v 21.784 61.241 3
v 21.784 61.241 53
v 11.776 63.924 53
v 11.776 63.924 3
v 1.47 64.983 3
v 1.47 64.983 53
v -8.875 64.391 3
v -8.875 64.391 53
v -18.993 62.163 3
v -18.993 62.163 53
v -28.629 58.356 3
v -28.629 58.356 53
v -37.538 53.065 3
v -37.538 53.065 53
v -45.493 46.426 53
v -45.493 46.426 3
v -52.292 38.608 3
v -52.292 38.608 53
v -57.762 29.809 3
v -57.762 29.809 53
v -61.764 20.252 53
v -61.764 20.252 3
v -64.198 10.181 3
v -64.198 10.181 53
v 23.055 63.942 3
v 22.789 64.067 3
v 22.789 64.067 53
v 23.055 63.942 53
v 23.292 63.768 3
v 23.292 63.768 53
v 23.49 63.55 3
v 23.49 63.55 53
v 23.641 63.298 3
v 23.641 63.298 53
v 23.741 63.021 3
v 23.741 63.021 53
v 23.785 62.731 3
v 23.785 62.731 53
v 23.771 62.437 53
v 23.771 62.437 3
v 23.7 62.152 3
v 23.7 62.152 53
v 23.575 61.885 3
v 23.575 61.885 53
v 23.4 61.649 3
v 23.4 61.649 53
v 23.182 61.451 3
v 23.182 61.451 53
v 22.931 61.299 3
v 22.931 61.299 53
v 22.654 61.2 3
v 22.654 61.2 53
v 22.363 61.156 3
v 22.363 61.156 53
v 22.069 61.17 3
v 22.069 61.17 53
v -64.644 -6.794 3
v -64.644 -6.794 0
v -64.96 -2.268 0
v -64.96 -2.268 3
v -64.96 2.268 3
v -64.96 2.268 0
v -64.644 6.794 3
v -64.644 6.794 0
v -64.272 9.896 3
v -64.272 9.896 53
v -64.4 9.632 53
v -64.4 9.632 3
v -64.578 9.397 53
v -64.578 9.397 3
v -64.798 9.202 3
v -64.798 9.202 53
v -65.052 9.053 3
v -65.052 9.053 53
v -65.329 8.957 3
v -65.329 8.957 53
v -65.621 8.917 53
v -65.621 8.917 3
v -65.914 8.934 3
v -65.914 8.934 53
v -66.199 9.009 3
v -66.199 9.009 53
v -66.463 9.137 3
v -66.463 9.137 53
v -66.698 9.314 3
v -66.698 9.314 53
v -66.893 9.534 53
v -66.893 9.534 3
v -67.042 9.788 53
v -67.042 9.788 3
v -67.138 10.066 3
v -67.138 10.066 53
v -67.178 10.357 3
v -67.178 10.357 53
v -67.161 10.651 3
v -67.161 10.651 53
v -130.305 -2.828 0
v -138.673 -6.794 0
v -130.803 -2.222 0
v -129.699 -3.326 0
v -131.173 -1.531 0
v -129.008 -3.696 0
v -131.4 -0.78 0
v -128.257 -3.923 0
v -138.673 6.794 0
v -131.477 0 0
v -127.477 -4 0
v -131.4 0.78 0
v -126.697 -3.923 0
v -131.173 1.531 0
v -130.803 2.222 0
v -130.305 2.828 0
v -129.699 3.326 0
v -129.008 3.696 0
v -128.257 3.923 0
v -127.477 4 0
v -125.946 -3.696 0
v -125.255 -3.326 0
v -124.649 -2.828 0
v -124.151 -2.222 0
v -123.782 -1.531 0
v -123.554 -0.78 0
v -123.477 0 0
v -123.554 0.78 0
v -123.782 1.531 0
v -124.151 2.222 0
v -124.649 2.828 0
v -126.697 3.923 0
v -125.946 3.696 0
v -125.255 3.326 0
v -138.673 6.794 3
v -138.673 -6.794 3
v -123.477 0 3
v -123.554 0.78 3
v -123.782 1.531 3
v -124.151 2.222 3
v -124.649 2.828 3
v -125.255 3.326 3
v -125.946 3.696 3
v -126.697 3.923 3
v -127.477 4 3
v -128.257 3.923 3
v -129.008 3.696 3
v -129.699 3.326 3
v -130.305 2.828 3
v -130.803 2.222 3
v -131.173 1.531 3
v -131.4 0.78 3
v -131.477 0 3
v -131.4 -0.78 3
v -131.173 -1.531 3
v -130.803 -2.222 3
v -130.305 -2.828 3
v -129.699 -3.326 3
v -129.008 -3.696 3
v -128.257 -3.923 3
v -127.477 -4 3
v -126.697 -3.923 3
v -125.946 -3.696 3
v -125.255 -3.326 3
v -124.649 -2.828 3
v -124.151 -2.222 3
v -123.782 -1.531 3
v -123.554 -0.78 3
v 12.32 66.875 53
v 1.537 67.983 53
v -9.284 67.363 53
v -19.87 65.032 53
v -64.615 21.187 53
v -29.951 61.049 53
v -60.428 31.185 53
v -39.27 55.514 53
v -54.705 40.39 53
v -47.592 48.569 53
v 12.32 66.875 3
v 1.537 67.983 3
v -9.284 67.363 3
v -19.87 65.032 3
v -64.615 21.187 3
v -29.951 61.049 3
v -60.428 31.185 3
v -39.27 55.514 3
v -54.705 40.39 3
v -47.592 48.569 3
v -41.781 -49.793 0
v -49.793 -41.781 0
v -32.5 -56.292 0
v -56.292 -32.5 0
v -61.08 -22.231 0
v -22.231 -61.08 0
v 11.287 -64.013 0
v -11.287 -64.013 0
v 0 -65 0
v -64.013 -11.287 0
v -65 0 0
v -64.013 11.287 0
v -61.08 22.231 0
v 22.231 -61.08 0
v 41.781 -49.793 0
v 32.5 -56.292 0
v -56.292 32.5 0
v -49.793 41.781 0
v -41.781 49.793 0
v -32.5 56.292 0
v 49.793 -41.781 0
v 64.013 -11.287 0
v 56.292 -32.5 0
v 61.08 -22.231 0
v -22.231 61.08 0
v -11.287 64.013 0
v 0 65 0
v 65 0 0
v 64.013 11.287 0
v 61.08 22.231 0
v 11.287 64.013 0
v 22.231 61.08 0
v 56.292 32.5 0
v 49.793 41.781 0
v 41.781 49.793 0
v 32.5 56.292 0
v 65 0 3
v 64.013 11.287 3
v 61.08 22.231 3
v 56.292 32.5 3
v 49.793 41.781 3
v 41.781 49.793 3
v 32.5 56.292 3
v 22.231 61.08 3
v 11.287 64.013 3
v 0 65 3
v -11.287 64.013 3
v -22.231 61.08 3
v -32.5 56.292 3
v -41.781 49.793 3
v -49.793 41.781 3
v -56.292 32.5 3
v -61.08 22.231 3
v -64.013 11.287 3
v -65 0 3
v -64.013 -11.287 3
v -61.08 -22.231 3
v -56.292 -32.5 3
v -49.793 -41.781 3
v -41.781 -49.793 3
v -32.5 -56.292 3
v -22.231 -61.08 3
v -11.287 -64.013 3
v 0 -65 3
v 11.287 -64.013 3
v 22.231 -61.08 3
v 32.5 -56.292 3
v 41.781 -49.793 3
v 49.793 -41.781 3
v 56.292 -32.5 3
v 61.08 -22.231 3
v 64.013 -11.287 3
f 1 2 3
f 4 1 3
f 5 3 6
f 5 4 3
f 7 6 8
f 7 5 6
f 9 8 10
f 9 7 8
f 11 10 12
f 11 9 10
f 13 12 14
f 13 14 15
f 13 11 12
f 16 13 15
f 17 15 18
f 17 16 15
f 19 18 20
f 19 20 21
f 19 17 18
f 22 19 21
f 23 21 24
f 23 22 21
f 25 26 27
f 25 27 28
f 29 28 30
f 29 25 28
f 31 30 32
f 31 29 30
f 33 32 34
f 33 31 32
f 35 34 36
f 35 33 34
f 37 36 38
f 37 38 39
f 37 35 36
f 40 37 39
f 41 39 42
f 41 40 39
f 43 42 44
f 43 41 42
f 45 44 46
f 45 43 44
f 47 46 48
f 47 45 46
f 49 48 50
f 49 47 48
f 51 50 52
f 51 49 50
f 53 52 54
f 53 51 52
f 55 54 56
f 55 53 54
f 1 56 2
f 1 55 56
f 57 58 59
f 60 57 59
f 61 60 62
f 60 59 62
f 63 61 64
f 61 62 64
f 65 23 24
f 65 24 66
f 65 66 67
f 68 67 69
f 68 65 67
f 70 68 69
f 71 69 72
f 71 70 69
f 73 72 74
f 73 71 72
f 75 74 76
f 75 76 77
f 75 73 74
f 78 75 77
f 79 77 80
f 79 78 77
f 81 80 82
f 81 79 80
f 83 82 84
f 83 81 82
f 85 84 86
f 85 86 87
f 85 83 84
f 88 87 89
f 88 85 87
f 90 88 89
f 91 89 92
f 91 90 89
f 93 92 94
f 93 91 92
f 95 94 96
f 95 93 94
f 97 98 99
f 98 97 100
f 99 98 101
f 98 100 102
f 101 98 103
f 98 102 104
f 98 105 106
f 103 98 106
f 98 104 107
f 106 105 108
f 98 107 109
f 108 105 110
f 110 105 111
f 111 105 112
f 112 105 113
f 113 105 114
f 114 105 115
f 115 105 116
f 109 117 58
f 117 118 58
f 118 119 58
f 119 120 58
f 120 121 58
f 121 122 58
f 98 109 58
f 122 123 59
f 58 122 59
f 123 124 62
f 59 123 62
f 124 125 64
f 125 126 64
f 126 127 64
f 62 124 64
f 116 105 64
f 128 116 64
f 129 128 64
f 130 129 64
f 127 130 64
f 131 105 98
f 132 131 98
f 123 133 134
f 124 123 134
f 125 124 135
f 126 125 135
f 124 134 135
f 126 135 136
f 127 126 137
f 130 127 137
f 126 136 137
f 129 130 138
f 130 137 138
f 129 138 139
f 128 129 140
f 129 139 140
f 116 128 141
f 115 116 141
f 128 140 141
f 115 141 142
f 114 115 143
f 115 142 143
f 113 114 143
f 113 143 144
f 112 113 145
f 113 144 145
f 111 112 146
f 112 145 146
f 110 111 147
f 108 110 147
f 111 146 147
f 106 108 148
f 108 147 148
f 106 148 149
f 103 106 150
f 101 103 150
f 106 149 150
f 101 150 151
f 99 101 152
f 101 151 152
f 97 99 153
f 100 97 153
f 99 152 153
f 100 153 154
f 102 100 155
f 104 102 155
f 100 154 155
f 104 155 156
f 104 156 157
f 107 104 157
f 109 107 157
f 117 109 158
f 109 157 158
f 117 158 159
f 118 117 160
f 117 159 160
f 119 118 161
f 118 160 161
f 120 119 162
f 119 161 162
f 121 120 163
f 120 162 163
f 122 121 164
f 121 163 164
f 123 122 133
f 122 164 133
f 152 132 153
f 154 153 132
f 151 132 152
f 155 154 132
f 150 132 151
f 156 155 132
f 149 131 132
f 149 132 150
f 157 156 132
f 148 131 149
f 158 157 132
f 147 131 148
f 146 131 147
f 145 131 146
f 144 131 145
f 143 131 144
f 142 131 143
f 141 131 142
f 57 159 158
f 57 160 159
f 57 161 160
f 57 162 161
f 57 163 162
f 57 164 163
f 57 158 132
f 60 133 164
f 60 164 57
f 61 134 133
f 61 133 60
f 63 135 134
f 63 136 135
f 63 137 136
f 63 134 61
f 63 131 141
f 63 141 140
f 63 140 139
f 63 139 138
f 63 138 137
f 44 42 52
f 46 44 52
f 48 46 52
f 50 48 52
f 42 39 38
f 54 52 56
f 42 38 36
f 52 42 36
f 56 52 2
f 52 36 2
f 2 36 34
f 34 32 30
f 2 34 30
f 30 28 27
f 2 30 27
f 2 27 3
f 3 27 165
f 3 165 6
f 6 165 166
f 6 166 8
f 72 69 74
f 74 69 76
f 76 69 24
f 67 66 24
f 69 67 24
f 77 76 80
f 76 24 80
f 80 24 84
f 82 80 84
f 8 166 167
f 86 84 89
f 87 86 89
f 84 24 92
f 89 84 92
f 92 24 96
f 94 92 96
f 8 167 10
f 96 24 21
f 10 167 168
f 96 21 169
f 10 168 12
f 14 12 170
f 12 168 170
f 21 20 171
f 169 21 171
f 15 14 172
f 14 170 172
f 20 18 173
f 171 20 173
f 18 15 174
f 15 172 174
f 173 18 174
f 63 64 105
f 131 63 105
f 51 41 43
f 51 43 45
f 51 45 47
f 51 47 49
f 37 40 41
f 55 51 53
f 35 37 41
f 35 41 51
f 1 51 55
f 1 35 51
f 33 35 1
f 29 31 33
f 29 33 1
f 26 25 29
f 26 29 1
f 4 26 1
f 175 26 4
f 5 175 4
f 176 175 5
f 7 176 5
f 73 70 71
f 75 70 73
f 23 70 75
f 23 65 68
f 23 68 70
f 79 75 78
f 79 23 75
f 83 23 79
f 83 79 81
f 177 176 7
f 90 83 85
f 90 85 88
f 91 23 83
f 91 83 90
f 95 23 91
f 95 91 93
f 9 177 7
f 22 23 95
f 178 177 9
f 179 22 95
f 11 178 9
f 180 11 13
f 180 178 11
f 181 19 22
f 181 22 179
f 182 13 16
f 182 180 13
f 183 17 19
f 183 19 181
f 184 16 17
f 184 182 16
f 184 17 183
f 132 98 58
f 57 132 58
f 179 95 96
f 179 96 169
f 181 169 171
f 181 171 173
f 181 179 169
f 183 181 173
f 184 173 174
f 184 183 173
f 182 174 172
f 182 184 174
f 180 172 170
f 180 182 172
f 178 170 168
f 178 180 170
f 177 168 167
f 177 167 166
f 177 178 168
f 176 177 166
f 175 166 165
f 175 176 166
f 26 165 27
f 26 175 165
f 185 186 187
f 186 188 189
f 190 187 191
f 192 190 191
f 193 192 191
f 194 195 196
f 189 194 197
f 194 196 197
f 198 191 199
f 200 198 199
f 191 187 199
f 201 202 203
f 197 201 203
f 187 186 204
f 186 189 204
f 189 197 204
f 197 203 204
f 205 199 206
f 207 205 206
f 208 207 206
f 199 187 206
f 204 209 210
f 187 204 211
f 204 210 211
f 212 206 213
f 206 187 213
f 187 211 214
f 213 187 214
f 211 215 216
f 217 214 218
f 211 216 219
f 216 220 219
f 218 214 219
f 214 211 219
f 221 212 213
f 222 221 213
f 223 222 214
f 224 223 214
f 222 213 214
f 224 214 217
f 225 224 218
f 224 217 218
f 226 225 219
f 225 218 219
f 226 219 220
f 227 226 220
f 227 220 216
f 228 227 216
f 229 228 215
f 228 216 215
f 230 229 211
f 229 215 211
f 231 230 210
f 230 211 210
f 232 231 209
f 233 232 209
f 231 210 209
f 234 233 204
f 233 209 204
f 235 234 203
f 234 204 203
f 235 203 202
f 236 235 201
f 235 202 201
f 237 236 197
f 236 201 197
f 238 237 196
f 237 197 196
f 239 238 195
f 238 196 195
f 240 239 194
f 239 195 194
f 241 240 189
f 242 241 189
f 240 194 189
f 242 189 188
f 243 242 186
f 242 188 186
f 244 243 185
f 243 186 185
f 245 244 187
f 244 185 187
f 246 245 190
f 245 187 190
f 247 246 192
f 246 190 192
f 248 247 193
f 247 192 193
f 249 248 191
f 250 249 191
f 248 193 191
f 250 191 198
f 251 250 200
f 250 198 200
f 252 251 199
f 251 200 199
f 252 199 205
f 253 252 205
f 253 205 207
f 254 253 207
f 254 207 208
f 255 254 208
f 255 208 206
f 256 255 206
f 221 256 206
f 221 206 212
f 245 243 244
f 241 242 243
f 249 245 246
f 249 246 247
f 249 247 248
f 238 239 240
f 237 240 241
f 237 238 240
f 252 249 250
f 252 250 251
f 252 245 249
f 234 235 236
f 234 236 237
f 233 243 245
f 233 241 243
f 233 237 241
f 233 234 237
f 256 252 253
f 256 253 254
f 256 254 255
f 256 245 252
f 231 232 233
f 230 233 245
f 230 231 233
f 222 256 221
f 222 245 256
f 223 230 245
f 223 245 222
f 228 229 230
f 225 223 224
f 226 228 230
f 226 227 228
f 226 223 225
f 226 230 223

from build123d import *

# Parameters (mm, degrees)
ESQUISSE1_R             = 65
BOSS_EXTRU_1_DEPTH      = 3
BOSS_EXTRU_3_DEPTH      = 3
ESQUISSE4_R             = 4
ENL_V_MAT_EXTRU_1_DEPTH = 3
BOSS_EXTRU_4_DEPTH      = 50


with BuildPart() as part:
    # Esquisse1 → Boss.-Extru.1 (new body)
    with BuildSketch(Plane.XY):
        Circle(ESQUISSE1_R)
    extrude(amount=BOSS_EXTRU_1_DEPTH)


with BuildPart() as body_2:
    # Esquisse3 → Boss.-Extru.3 (new body)
    with BuildSketch(Plane(origin=(0, 0, 0), x_dir=(-1, 0, 0), z_dir=(0, 0, -1))):
        with BuildLine():
            Line((64.643923199, 6.794350112), (138.672522355, 6.794350112))
            Line((138.672522355, 6.794350112), (138.672522355, -6.794350112))
            Line((138.672522355, -6.794350112), (64.643923199, -6.794350112))
            ThreePointArc((64.643923199, -6.794350112), (65, 0), (64.643923199, 6.794350112))
        make_face()
    extrude(amount=-BOSS_EXTRU_3_DEPTH)

    # Esquisse4 → Enlèv. mat.-Extru.1 (cut)
    with BuildSketch(Plane.XY.offset(3)):
        with Locations((-127.477067306, 0)):
            Circle(ESQUISSE4_R)
    extrude(amount=-ENL_V_MAT_EXTRU_1_DEPTH, mode=Mode.SUBTRACT)


with BuildPart() as body_3:
    # Esquisse5 → Boss.-Extru.4 (new body)
    with BuildSketch(Plane.XY.offset(3)):
        with BuildLine():
            ThreePointArc((21.78396045, 61.240991722), (-33.189134732, 55.888114441), (-64.197754074, 10.180784442))
            ThreePointArc((-64.197754074, 10.180784442), (-65.914181886, 8.934238989), (-67.160727339, 10.650666801))
            ThreePointArc((-67.160727339, 10.650666801), (-34.72094095, 58.467565876), (22.789374009, 64.067499032))
            ThreePointArc((22.789374009, 64.067499032), (23.699920885, 62.151538598), (21.78396045, 61.240991722))
        make_face()
    extrude(amount=BOSS_EXTRU_4_DEPTH)


solid = Compound([part.part, body_2.part, body_3.part])
